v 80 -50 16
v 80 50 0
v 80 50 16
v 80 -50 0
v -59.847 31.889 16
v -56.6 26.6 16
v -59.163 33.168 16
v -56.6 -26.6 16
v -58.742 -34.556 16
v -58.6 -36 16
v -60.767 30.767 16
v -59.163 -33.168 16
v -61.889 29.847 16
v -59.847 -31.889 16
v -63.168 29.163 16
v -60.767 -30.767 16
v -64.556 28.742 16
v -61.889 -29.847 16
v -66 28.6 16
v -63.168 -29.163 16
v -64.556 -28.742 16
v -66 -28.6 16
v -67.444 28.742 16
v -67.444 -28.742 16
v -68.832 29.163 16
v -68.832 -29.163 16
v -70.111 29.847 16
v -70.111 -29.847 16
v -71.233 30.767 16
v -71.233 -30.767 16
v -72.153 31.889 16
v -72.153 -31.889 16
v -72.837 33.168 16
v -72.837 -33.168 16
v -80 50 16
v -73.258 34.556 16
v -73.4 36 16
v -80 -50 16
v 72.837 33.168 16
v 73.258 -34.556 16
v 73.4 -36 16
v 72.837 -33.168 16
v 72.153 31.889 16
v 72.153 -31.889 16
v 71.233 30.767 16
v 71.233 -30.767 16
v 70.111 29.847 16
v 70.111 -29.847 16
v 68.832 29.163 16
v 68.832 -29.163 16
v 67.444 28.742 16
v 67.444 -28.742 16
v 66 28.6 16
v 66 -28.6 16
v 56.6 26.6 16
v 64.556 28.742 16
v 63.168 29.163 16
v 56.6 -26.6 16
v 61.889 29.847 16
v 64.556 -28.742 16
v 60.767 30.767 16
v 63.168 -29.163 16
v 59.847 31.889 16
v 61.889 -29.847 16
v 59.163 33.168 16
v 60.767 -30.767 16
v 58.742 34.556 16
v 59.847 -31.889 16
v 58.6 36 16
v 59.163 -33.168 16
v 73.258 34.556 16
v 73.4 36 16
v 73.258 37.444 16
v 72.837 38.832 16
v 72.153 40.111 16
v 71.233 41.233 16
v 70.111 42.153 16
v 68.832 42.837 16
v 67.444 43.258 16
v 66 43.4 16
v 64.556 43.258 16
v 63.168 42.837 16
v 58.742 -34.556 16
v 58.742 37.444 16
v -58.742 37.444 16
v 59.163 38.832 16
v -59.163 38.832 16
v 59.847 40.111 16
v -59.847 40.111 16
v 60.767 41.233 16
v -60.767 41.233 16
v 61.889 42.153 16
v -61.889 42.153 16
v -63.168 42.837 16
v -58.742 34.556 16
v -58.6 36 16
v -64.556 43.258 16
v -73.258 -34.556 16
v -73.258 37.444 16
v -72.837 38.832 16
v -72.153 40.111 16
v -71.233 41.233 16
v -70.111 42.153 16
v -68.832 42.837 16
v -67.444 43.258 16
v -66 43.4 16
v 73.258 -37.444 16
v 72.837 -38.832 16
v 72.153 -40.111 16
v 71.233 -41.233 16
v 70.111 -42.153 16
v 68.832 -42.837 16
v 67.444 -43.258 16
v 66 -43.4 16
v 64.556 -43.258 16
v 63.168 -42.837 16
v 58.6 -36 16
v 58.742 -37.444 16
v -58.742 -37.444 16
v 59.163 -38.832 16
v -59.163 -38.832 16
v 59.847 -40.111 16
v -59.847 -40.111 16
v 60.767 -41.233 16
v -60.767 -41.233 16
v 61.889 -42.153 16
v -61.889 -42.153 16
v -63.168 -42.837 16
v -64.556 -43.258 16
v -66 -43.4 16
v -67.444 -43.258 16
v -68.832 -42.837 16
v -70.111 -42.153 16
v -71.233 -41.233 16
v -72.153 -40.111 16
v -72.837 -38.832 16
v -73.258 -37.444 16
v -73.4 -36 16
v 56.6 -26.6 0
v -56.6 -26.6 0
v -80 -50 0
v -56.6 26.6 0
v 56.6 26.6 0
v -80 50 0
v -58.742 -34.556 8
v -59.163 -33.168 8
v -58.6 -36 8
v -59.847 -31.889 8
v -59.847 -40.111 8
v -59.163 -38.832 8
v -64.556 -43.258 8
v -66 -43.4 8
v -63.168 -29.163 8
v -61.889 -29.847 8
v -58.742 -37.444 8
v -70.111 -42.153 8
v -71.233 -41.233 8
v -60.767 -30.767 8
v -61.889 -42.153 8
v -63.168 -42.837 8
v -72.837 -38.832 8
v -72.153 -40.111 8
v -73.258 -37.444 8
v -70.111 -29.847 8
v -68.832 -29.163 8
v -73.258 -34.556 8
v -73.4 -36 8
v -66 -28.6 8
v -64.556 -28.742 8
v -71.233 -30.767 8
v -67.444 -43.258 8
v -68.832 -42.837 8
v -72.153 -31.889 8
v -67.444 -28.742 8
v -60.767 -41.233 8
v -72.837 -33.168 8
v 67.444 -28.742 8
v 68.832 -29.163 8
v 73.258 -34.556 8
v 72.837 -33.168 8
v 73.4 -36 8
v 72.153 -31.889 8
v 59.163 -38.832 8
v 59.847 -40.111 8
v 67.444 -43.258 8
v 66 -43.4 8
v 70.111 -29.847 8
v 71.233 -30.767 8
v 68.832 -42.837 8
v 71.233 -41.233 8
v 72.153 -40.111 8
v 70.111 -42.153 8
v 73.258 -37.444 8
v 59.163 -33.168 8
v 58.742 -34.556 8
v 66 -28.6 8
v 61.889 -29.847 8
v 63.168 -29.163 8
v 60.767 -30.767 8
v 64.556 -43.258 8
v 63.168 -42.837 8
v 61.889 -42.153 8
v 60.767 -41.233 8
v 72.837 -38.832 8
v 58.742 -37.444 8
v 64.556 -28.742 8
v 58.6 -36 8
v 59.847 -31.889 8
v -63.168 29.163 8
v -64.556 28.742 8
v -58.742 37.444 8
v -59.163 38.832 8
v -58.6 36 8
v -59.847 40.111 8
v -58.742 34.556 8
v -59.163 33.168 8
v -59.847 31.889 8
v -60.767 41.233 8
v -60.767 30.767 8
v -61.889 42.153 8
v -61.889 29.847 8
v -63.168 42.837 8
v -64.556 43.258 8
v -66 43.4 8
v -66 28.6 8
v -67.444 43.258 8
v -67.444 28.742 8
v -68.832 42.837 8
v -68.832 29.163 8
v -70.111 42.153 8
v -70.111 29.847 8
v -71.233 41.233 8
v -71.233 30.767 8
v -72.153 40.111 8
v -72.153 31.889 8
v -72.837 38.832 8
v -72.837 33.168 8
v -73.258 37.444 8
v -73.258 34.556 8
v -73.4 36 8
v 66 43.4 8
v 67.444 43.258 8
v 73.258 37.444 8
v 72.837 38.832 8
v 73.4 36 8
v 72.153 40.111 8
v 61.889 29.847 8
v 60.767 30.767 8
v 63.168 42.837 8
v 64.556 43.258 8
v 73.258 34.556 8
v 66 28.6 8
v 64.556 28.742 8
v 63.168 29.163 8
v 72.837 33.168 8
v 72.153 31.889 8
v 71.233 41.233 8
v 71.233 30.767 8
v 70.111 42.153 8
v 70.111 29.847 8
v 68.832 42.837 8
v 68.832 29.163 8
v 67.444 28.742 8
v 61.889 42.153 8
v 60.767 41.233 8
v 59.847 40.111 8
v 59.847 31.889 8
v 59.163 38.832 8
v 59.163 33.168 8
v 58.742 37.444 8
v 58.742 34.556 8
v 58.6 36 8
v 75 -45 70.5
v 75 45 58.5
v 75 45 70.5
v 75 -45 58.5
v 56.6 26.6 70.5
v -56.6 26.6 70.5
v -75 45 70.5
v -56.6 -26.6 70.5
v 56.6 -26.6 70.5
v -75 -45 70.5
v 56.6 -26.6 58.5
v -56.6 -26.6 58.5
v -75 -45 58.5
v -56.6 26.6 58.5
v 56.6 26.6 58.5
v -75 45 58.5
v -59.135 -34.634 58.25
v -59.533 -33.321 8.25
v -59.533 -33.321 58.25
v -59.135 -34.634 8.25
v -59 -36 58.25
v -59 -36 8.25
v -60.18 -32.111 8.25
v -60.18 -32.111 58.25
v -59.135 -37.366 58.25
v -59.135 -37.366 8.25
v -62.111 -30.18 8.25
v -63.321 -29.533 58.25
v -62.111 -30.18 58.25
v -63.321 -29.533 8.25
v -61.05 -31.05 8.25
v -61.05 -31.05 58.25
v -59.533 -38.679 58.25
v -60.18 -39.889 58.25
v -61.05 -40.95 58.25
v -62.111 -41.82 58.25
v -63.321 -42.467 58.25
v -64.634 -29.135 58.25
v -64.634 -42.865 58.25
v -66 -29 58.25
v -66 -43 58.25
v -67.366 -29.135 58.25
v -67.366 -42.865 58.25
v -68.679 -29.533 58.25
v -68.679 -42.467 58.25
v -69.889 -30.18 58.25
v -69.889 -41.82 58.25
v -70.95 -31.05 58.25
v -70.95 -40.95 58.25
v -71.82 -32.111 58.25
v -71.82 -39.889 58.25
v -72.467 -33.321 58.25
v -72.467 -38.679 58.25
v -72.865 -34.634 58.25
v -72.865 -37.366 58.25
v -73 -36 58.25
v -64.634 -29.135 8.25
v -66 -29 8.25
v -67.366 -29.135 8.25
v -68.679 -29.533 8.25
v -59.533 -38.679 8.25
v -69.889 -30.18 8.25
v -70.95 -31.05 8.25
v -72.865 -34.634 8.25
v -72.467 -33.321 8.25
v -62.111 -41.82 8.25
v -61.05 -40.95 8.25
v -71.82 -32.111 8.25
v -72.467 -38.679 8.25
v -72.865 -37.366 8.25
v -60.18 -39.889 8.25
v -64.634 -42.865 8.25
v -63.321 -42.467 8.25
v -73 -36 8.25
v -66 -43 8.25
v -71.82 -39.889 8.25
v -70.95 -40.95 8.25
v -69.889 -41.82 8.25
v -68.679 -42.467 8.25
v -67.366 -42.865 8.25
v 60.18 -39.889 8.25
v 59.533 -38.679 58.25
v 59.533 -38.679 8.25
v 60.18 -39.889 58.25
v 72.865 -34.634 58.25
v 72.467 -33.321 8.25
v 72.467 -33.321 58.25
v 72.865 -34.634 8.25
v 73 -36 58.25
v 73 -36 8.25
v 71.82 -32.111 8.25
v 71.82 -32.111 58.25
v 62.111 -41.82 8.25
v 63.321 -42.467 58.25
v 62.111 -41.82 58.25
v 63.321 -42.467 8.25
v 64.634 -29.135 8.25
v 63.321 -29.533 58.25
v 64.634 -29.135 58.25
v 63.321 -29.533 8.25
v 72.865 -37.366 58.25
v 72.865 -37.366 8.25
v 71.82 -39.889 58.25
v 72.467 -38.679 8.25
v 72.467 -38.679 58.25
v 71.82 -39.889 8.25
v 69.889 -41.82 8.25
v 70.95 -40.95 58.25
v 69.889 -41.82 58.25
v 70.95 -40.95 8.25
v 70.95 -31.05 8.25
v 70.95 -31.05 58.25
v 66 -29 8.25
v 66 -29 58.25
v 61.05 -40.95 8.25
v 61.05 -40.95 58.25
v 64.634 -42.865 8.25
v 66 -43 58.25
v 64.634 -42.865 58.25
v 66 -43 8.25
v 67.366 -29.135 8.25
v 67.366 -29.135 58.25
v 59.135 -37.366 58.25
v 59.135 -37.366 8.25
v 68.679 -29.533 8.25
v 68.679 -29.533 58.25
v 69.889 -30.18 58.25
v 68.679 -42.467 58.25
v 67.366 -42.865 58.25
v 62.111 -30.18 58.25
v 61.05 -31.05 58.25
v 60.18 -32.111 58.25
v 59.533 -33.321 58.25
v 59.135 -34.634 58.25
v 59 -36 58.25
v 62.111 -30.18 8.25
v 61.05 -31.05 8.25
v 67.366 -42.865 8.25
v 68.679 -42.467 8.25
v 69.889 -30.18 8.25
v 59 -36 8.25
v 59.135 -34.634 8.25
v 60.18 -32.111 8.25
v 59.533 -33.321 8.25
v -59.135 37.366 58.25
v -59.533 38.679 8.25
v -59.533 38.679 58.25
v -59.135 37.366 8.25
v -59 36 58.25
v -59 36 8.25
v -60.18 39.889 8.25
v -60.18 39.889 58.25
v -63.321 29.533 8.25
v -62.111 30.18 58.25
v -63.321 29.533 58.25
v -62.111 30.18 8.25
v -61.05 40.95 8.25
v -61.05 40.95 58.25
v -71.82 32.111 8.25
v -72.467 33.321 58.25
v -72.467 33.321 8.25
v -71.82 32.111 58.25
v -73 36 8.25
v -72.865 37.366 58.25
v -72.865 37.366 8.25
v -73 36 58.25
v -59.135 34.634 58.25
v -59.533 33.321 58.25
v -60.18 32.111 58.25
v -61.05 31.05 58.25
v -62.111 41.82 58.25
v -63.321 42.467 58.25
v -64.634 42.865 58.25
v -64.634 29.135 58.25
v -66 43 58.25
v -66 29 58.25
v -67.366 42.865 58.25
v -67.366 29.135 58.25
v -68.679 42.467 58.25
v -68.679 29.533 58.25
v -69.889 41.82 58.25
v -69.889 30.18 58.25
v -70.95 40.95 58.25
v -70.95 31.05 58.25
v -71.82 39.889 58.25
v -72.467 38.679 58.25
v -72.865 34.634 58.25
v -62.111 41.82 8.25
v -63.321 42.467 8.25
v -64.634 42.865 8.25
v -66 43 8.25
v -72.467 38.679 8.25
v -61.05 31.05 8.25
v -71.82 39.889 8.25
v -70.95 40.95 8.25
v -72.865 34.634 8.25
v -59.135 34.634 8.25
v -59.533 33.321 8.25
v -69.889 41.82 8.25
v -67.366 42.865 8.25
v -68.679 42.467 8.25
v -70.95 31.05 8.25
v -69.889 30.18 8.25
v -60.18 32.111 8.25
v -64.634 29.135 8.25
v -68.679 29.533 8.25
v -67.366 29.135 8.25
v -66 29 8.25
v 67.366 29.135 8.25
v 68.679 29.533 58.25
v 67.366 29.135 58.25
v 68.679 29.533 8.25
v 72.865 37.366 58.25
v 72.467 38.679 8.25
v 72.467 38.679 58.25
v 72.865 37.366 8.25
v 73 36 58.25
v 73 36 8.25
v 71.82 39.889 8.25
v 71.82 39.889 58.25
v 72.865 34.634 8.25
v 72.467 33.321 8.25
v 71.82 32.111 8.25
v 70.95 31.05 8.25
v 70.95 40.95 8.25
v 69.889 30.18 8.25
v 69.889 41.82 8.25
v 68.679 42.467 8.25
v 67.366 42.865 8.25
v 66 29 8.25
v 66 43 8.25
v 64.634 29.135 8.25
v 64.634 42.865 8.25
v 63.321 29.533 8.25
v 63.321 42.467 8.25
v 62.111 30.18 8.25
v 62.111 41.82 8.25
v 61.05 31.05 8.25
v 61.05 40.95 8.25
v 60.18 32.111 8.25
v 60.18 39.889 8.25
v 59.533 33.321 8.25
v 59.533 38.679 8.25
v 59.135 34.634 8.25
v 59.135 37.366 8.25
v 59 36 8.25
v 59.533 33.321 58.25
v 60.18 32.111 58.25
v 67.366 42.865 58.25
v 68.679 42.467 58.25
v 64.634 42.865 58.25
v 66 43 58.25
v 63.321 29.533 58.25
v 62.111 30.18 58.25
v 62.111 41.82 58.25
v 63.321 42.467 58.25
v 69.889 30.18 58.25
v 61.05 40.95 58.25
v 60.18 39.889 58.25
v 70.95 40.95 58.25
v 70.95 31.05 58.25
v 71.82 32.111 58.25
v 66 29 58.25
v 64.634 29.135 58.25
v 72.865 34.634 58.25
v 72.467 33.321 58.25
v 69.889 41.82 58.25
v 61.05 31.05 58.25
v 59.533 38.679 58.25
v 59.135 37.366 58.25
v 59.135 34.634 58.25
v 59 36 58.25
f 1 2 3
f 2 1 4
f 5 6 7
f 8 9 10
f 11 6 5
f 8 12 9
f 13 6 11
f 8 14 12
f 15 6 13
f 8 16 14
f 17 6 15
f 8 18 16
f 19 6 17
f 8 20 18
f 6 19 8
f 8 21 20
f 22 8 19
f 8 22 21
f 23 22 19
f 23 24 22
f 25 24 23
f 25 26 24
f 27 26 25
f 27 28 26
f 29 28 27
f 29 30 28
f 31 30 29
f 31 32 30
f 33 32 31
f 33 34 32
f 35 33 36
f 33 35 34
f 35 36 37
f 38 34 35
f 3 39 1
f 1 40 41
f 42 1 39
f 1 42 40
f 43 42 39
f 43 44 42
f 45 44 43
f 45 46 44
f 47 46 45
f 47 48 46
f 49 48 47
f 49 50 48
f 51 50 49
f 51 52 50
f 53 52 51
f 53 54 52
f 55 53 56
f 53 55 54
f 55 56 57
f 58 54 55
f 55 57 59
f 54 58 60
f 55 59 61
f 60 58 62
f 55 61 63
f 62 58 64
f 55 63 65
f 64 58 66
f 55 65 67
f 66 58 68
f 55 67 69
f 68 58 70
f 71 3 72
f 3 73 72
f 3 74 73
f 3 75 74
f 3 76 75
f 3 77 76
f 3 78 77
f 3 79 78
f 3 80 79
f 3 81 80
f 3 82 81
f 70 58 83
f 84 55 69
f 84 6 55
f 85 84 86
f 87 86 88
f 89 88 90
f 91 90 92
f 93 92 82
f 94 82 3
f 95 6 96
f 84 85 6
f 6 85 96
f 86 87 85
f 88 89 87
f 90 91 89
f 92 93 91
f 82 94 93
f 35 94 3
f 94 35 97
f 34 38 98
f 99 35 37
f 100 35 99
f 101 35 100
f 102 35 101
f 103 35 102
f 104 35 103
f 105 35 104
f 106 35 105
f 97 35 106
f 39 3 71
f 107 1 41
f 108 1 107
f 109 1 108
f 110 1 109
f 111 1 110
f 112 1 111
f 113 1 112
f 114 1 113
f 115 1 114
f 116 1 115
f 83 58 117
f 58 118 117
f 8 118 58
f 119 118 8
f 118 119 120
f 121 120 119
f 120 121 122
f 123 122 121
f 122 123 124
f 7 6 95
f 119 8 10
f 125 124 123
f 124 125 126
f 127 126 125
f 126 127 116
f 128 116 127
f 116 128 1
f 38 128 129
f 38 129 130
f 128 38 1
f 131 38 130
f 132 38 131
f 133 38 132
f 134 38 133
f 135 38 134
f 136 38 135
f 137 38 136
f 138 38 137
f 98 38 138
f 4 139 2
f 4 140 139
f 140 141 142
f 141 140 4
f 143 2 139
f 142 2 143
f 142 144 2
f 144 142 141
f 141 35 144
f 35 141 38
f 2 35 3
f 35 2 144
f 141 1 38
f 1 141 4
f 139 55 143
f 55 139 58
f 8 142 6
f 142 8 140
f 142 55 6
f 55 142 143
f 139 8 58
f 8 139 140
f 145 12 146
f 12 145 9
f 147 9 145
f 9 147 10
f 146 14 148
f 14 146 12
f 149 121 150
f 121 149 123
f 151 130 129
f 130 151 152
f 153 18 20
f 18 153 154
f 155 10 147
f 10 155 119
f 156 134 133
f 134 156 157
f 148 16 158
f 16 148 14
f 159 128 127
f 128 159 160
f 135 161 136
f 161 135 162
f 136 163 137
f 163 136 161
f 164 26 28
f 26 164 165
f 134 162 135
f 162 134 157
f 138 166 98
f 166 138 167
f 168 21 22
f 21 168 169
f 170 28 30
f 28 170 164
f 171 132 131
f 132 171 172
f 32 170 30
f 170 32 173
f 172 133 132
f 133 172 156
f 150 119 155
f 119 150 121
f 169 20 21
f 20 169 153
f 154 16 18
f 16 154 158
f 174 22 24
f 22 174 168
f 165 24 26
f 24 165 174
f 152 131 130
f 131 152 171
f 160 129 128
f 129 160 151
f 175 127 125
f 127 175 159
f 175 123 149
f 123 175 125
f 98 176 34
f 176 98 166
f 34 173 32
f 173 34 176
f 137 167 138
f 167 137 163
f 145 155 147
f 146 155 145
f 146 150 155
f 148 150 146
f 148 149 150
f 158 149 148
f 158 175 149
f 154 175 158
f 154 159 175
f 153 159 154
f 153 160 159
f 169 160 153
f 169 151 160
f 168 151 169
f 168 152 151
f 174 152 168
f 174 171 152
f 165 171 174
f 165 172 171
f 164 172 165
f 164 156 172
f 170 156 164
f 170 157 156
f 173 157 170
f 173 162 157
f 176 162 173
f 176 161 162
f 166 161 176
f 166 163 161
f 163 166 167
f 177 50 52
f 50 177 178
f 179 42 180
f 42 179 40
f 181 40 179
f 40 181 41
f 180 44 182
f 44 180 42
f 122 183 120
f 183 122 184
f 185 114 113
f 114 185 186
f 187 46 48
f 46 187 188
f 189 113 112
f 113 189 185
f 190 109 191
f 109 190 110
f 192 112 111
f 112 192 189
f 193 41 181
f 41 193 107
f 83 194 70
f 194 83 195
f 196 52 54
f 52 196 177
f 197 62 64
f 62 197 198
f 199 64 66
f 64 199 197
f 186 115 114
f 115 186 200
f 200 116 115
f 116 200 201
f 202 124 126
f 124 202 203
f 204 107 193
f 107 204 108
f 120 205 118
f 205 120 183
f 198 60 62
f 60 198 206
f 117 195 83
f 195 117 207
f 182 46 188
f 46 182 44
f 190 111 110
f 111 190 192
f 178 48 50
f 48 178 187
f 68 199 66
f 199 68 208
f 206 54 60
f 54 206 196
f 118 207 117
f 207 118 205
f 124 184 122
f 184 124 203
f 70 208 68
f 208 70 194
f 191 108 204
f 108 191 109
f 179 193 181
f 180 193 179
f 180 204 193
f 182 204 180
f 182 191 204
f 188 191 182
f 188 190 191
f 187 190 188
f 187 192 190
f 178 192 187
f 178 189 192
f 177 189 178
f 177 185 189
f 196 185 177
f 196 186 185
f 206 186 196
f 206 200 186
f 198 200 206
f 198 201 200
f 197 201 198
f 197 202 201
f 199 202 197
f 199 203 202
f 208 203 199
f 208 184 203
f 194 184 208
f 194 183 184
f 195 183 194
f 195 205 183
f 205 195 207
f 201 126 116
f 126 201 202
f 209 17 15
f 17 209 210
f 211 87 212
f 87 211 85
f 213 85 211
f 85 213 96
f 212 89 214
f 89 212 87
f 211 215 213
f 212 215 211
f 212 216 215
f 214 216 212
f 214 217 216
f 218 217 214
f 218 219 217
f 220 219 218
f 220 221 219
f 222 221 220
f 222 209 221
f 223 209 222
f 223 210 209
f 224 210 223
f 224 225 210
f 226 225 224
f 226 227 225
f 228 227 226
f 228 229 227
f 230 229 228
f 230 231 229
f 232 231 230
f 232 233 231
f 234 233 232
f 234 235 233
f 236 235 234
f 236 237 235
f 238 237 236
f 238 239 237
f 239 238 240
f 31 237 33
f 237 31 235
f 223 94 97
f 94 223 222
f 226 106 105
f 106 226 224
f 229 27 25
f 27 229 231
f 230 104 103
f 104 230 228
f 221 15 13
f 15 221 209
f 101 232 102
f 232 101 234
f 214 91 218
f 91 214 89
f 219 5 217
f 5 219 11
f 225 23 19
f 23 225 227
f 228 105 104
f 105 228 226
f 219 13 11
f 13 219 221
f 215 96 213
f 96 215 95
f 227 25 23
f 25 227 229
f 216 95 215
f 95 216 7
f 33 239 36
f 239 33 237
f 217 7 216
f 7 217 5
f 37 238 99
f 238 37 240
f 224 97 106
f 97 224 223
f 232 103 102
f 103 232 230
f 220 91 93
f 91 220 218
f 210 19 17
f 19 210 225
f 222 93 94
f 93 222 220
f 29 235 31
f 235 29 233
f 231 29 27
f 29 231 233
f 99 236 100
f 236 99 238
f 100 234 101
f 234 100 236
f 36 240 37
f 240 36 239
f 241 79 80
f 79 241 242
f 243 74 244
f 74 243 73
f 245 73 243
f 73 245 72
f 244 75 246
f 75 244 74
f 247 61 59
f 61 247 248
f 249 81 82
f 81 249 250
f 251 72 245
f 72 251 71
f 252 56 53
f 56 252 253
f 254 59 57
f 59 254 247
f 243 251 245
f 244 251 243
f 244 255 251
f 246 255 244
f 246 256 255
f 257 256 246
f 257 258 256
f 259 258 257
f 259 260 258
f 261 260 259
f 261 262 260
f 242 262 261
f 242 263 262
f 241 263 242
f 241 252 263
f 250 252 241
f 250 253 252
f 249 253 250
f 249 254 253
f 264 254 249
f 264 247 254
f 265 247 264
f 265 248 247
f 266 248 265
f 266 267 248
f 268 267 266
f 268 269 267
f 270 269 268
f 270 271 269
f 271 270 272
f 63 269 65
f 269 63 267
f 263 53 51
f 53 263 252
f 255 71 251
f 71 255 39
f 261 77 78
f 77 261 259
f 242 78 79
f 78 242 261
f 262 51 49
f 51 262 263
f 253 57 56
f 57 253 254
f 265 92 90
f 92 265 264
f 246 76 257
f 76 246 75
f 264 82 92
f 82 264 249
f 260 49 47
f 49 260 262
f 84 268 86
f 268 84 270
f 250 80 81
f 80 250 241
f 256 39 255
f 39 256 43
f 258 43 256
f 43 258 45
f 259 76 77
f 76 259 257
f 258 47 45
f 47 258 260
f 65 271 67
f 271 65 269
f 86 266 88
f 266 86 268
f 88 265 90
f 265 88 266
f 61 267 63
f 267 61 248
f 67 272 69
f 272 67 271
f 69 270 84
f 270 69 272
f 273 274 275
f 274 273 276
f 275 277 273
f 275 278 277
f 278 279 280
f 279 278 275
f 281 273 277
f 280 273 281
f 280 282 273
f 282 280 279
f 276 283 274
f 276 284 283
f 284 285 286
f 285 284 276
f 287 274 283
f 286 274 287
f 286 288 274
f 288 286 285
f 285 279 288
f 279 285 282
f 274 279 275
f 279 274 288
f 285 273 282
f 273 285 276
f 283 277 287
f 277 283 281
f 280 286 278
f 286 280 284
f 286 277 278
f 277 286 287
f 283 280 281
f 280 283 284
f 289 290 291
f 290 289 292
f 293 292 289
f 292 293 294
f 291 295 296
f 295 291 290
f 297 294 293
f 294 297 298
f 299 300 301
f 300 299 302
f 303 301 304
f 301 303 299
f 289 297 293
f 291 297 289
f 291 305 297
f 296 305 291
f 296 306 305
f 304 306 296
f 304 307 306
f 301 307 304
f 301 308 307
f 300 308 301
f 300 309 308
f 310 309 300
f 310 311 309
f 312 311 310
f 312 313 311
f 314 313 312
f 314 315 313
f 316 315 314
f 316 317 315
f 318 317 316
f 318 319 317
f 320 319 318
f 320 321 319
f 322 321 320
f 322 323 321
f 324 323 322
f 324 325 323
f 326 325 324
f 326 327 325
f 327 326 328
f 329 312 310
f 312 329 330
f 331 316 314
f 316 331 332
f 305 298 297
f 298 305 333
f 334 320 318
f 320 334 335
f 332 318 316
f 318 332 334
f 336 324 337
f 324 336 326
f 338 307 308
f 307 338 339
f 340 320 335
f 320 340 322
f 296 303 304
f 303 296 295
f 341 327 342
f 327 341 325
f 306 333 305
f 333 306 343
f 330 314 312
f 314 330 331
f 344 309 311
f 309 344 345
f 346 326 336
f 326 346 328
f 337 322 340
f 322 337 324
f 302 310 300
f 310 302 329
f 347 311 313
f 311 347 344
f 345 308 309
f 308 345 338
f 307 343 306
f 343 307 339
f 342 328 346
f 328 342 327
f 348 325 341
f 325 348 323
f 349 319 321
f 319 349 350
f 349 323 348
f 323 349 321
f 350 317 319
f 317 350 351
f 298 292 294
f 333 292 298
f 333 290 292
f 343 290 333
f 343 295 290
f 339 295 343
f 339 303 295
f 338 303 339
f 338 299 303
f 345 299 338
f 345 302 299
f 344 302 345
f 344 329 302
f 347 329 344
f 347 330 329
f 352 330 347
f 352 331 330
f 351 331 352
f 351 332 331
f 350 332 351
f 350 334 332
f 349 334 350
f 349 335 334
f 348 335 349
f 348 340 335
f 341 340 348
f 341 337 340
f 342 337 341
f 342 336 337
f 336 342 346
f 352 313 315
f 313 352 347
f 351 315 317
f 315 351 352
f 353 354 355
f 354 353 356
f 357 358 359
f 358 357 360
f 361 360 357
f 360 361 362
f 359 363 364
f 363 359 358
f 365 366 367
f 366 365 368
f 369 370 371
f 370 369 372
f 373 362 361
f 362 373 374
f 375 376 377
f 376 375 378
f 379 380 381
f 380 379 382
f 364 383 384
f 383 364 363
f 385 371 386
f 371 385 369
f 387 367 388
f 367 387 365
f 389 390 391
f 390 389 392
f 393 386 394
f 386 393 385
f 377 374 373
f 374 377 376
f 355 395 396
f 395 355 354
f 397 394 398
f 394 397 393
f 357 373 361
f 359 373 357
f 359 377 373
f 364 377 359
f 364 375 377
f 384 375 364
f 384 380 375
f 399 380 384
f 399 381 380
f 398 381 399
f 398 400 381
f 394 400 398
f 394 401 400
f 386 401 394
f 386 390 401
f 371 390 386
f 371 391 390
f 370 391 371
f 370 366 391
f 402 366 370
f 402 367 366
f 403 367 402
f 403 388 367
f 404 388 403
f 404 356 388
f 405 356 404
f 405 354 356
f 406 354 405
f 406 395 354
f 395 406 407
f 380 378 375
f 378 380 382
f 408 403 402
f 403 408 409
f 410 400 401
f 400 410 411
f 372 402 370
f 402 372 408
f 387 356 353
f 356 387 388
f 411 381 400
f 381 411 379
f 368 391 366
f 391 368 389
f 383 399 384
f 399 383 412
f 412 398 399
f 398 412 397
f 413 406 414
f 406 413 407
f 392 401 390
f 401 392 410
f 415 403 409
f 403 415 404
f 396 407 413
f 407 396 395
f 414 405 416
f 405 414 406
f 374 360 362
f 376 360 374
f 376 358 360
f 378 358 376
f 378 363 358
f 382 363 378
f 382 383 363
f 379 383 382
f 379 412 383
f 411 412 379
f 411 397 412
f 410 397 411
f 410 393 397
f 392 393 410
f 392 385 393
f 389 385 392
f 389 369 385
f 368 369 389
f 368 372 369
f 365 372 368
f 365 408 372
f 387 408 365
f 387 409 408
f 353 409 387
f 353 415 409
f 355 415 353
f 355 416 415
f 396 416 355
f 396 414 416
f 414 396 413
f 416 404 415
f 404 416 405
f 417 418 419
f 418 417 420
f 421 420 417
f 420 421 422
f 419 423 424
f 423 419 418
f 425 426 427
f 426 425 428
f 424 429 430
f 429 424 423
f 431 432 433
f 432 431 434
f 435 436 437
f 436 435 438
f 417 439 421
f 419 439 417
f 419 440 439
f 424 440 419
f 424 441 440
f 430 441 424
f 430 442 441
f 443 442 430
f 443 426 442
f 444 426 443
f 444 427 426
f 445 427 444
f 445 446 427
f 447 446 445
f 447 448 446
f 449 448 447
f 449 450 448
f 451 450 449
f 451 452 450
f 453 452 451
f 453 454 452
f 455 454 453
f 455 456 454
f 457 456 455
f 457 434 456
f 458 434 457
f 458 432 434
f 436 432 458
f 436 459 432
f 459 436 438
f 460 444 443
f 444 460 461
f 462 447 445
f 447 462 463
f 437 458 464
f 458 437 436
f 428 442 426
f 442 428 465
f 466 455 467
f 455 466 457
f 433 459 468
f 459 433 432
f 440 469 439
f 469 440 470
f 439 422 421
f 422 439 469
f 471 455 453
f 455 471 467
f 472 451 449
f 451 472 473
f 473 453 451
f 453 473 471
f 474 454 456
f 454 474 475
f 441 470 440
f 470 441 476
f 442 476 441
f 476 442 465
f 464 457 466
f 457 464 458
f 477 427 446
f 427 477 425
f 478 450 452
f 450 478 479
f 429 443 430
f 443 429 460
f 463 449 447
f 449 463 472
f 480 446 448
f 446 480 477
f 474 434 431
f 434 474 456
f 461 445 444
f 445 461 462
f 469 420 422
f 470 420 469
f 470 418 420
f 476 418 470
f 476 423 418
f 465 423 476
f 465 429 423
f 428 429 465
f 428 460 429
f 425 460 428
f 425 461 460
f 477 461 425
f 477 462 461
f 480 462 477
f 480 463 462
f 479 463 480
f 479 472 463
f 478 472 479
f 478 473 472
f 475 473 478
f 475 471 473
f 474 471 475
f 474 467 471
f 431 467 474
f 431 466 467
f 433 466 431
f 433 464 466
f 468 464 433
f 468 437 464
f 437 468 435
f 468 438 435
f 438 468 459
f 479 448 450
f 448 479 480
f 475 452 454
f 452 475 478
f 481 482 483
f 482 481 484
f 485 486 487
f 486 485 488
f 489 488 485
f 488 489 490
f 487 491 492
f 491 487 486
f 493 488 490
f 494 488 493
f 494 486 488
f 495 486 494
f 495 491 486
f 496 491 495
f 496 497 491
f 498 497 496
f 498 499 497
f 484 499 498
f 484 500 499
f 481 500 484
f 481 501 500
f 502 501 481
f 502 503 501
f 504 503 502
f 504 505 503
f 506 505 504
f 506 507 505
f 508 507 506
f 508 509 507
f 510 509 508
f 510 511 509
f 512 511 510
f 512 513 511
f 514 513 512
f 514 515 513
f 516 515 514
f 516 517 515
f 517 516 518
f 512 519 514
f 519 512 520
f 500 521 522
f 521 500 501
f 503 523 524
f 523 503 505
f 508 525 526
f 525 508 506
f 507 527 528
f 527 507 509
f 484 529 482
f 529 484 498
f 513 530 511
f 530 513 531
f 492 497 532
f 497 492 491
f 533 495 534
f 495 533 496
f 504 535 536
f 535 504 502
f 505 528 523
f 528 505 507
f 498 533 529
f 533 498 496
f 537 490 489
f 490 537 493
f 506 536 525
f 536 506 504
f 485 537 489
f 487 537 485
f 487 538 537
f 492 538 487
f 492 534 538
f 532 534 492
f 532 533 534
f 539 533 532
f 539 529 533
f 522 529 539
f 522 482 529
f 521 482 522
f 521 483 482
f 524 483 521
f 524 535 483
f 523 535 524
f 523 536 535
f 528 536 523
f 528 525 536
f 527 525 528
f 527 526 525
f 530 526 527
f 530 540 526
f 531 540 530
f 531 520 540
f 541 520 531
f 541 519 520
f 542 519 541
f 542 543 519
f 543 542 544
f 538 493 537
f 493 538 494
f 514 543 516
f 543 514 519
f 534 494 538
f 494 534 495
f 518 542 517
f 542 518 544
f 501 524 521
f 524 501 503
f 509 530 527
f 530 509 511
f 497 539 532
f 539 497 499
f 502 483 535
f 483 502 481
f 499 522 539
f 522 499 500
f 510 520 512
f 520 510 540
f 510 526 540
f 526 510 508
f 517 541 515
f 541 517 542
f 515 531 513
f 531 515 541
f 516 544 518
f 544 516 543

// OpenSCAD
$fn = 32;

// ------------------------------------------------------------------------
// Frame cube: base 160 x 100 mm, posts 50 mm tall
// Every part is its own module, assembly() places every instance.
// ------------------------------------------------------------------------

// --- part 1 ---
module base_frame() {
  difference() {
    translate([-80, -50, 0]) cube([160, 100, 16]);
    translate([-56.6, -26.6, -1]) cube([113.2, 53.2, 18]);
    translate([-66, -36, 8]) cylinder(h = 9, d = 14.8);
    translate([66, -36, 8]) cylinder(h = 9, d = 14.8);
    translate([-66, 36, 8]) cylinder(h = 9, d = 14.8);
    translate([66, 36, 8]) cylinder(h = 9, d = 14.8);
  }
}

// --- part 2 ---
module corner_post() {
  cylinder(h = 50, d = 14);
}

// --- part 3 ---
module top_frame() {
  difference() {
    translate([-75, -45, 0]) cube([150, 90, 12]);
    translate([-56.6, -26.6, -1]) cube([113.2, 53.2, 14]);
  }
}

// --- assembly ---
module assembly() {
  color([0.80, 0.24, 0.20]) translate([0, 0, 0]) rotate([0, 0, 0]) base_frame();
  color([0.20, 0.45, 0.75]) translate([-66, -36, 8.25]) rotate([0, 0, 0]) corner_post();
  color([0.25, 0.62, 0.32]) translate([66, -36, 8.25]) rotate([0, 0, 0]) corner_post();
  color([0.92, 0.70, 0.18]) translate([-66, 36, 8.25]) rotate([0, 0, 0]) corner_post();
  color([0.58, 0.35, 0.70]) translate([66, 36, 8.25]) rotate([0, 0, 0]) corner_post();
  color([0.16, 0.66, 0.66]) translate([0, 0, 58.5]) rotate([0, 0, 0]) top_frame();
}

assembly();
